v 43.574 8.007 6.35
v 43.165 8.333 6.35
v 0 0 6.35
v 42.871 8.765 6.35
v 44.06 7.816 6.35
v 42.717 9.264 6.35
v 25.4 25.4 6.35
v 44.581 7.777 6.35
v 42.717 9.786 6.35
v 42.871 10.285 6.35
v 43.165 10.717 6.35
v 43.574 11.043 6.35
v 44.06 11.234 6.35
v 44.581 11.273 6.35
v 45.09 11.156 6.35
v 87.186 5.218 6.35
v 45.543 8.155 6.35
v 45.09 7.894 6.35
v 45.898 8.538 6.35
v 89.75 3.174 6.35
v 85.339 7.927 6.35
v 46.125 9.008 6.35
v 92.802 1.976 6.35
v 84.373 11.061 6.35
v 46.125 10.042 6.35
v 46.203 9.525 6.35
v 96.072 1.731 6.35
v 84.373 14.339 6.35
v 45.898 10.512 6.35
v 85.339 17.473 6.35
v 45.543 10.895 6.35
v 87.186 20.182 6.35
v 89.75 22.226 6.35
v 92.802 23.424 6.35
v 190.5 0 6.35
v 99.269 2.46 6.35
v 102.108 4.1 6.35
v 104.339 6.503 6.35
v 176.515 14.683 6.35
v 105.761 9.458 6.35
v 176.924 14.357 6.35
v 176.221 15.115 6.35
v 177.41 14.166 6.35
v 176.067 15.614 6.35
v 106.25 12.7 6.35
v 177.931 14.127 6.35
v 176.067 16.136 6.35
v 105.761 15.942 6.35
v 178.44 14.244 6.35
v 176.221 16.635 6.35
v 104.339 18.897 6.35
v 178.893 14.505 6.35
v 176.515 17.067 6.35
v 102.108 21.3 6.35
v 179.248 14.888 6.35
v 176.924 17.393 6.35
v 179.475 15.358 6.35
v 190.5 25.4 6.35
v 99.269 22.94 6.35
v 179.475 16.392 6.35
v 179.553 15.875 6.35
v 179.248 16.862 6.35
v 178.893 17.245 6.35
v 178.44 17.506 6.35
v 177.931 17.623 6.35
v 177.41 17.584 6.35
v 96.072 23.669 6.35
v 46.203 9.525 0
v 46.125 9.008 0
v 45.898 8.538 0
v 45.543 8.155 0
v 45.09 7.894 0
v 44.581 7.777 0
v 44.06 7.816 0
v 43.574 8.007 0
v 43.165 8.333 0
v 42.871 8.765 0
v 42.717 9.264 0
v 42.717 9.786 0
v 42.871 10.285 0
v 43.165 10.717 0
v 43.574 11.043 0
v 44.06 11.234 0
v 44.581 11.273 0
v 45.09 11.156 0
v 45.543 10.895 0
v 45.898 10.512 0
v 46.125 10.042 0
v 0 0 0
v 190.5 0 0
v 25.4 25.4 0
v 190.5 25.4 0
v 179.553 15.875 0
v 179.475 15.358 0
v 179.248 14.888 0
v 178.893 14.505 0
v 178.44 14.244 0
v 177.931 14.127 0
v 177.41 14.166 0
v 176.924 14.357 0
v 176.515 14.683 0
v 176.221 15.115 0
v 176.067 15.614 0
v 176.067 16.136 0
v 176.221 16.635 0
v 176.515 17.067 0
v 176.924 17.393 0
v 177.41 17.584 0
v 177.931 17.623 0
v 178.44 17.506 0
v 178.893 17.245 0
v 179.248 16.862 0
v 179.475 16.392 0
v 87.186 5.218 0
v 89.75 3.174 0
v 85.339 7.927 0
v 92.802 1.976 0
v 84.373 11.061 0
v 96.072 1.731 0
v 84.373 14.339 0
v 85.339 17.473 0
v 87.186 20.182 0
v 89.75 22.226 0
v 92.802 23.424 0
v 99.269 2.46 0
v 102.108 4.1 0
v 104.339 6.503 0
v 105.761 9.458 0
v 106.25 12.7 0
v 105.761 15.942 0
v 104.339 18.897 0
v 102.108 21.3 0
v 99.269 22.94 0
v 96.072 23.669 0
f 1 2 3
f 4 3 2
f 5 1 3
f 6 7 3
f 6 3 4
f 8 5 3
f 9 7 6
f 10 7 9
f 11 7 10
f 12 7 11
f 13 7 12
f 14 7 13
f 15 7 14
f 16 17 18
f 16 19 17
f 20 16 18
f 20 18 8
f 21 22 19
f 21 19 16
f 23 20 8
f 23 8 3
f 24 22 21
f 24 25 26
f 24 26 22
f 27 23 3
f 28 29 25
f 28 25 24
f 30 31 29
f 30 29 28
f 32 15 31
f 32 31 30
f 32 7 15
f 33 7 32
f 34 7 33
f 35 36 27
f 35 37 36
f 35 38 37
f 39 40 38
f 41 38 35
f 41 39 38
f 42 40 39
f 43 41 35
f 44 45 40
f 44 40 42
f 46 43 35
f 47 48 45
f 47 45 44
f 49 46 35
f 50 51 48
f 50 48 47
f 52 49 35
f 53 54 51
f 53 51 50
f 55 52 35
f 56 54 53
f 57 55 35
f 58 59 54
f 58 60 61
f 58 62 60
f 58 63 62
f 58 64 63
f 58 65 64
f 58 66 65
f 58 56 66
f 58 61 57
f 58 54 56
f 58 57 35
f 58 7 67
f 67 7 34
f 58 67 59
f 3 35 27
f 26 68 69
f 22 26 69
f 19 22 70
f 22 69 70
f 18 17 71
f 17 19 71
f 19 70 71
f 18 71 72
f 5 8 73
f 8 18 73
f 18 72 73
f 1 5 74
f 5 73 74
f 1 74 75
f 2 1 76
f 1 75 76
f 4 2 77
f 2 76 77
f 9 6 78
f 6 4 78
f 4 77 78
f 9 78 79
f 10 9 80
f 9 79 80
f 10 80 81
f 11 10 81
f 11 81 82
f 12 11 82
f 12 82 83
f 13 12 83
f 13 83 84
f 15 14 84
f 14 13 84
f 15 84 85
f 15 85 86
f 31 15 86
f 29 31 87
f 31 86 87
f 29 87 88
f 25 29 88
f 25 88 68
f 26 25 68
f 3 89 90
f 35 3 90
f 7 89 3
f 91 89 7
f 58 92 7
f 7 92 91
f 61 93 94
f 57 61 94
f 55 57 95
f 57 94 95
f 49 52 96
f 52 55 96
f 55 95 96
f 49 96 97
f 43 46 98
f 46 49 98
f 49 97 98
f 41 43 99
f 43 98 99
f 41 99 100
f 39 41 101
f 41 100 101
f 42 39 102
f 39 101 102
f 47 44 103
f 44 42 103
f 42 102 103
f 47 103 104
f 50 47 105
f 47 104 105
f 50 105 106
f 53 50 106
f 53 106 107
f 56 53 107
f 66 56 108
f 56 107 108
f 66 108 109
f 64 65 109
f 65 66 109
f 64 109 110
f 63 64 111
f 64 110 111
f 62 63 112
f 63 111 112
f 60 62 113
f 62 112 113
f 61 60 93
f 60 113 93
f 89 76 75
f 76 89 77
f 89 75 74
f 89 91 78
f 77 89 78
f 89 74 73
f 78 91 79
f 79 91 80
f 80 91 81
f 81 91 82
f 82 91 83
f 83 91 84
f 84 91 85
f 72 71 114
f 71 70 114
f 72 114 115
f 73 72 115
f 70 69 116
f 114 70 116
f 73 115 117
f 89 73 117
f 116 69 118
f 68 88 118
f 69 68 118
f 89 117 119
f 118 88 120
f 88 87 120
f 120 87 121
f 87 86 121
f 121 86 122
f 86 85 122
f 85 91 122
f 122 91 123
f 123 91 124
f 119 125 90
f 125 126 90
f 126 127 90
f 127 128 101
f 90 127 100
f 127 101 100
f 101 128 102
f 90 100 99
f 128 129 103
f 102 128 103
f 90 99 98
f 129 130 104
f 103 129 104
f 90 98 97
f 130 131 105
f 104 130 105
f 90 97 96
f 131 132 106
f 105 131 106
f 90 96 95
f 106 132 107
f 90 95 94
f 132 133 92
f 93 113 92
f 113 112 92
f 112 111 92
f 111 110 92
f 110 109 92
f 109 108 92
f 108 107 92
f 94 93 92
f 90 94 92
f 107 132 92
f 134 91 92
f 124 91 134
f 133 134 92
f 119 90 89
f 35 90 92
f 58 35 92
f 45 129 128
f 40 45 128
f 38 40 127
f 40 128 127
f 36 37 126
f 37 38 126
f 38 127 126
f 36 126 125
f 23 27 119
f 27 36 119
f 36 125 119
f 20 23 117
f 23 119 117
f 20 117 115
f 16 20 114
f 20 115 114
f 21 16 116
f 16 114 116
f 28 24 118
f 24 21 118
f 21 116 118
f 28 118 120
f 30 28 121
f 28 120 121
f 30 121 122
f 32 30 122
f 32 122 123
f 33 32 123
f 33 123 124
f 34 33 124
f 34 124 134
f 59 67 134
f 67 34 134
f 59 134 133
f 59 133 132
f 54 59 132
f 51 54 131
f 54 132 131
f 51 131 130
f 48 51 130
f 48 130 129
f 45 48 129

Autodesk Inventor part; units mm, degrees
ref_plane "YZ Plane" through (0, 0, 0) normal (1, 0, 0) x (0, 1, 0)
ref_plane "XZ Plane" through (0, 0, 0) normal (0, 1, 0) x (-1, 0, 0)
ref_plane "XY Plane" through (0, 0, 0) normal (0, 0, 1) x (1, 0, 0)
sketch "Sketch1" plane through (0, 0, 0) normal (0, 0, 1) x (1, 0, 0)
  line L0 (0, 0) -> (190.5, 0)
  line L1 (190.5, 0) -> (190.5, 25.4)
  line L2 (190.5, 25.4) -> (0, 25.4)
  line L3 (0, 25.4) -> (0, 0)
  line L4 (0, 12.7) -> (190.5, 12.7) construction
  circle A0 centre (95.25, 12.7) radius 11
  line L5 (0, 0) -> (25.4, 25.4)
  circle A1 centre (177.8, 15.875) radius 25.4 construction
  circle A2 centre (177.8, 15.875) radius 1.7526
  circle A3 centre (44.45, 9.525) radius 1.7526
  dimension "d0" = 190.5
  dimension "d1" = 25.4
  dimension "d6" = 22
  dimension "d7" = 95.25
  dimension "d8" = 45
  dimension "d9" = 50.8
  dimension "d10" = 3.5052
  dimension "d11" = 12.7
  dimension "d12" = 9.525
  dimension "d13" = 3.5052
  dimension "d14" = 9.525
  dimension "d15" = 44.45
extrude "Extrusion1" add sketch "Sketch1" along normal blind 6.35 contours L5 L2 L1 L0
properties part number "Side_Plate" material "UHMW, White"
